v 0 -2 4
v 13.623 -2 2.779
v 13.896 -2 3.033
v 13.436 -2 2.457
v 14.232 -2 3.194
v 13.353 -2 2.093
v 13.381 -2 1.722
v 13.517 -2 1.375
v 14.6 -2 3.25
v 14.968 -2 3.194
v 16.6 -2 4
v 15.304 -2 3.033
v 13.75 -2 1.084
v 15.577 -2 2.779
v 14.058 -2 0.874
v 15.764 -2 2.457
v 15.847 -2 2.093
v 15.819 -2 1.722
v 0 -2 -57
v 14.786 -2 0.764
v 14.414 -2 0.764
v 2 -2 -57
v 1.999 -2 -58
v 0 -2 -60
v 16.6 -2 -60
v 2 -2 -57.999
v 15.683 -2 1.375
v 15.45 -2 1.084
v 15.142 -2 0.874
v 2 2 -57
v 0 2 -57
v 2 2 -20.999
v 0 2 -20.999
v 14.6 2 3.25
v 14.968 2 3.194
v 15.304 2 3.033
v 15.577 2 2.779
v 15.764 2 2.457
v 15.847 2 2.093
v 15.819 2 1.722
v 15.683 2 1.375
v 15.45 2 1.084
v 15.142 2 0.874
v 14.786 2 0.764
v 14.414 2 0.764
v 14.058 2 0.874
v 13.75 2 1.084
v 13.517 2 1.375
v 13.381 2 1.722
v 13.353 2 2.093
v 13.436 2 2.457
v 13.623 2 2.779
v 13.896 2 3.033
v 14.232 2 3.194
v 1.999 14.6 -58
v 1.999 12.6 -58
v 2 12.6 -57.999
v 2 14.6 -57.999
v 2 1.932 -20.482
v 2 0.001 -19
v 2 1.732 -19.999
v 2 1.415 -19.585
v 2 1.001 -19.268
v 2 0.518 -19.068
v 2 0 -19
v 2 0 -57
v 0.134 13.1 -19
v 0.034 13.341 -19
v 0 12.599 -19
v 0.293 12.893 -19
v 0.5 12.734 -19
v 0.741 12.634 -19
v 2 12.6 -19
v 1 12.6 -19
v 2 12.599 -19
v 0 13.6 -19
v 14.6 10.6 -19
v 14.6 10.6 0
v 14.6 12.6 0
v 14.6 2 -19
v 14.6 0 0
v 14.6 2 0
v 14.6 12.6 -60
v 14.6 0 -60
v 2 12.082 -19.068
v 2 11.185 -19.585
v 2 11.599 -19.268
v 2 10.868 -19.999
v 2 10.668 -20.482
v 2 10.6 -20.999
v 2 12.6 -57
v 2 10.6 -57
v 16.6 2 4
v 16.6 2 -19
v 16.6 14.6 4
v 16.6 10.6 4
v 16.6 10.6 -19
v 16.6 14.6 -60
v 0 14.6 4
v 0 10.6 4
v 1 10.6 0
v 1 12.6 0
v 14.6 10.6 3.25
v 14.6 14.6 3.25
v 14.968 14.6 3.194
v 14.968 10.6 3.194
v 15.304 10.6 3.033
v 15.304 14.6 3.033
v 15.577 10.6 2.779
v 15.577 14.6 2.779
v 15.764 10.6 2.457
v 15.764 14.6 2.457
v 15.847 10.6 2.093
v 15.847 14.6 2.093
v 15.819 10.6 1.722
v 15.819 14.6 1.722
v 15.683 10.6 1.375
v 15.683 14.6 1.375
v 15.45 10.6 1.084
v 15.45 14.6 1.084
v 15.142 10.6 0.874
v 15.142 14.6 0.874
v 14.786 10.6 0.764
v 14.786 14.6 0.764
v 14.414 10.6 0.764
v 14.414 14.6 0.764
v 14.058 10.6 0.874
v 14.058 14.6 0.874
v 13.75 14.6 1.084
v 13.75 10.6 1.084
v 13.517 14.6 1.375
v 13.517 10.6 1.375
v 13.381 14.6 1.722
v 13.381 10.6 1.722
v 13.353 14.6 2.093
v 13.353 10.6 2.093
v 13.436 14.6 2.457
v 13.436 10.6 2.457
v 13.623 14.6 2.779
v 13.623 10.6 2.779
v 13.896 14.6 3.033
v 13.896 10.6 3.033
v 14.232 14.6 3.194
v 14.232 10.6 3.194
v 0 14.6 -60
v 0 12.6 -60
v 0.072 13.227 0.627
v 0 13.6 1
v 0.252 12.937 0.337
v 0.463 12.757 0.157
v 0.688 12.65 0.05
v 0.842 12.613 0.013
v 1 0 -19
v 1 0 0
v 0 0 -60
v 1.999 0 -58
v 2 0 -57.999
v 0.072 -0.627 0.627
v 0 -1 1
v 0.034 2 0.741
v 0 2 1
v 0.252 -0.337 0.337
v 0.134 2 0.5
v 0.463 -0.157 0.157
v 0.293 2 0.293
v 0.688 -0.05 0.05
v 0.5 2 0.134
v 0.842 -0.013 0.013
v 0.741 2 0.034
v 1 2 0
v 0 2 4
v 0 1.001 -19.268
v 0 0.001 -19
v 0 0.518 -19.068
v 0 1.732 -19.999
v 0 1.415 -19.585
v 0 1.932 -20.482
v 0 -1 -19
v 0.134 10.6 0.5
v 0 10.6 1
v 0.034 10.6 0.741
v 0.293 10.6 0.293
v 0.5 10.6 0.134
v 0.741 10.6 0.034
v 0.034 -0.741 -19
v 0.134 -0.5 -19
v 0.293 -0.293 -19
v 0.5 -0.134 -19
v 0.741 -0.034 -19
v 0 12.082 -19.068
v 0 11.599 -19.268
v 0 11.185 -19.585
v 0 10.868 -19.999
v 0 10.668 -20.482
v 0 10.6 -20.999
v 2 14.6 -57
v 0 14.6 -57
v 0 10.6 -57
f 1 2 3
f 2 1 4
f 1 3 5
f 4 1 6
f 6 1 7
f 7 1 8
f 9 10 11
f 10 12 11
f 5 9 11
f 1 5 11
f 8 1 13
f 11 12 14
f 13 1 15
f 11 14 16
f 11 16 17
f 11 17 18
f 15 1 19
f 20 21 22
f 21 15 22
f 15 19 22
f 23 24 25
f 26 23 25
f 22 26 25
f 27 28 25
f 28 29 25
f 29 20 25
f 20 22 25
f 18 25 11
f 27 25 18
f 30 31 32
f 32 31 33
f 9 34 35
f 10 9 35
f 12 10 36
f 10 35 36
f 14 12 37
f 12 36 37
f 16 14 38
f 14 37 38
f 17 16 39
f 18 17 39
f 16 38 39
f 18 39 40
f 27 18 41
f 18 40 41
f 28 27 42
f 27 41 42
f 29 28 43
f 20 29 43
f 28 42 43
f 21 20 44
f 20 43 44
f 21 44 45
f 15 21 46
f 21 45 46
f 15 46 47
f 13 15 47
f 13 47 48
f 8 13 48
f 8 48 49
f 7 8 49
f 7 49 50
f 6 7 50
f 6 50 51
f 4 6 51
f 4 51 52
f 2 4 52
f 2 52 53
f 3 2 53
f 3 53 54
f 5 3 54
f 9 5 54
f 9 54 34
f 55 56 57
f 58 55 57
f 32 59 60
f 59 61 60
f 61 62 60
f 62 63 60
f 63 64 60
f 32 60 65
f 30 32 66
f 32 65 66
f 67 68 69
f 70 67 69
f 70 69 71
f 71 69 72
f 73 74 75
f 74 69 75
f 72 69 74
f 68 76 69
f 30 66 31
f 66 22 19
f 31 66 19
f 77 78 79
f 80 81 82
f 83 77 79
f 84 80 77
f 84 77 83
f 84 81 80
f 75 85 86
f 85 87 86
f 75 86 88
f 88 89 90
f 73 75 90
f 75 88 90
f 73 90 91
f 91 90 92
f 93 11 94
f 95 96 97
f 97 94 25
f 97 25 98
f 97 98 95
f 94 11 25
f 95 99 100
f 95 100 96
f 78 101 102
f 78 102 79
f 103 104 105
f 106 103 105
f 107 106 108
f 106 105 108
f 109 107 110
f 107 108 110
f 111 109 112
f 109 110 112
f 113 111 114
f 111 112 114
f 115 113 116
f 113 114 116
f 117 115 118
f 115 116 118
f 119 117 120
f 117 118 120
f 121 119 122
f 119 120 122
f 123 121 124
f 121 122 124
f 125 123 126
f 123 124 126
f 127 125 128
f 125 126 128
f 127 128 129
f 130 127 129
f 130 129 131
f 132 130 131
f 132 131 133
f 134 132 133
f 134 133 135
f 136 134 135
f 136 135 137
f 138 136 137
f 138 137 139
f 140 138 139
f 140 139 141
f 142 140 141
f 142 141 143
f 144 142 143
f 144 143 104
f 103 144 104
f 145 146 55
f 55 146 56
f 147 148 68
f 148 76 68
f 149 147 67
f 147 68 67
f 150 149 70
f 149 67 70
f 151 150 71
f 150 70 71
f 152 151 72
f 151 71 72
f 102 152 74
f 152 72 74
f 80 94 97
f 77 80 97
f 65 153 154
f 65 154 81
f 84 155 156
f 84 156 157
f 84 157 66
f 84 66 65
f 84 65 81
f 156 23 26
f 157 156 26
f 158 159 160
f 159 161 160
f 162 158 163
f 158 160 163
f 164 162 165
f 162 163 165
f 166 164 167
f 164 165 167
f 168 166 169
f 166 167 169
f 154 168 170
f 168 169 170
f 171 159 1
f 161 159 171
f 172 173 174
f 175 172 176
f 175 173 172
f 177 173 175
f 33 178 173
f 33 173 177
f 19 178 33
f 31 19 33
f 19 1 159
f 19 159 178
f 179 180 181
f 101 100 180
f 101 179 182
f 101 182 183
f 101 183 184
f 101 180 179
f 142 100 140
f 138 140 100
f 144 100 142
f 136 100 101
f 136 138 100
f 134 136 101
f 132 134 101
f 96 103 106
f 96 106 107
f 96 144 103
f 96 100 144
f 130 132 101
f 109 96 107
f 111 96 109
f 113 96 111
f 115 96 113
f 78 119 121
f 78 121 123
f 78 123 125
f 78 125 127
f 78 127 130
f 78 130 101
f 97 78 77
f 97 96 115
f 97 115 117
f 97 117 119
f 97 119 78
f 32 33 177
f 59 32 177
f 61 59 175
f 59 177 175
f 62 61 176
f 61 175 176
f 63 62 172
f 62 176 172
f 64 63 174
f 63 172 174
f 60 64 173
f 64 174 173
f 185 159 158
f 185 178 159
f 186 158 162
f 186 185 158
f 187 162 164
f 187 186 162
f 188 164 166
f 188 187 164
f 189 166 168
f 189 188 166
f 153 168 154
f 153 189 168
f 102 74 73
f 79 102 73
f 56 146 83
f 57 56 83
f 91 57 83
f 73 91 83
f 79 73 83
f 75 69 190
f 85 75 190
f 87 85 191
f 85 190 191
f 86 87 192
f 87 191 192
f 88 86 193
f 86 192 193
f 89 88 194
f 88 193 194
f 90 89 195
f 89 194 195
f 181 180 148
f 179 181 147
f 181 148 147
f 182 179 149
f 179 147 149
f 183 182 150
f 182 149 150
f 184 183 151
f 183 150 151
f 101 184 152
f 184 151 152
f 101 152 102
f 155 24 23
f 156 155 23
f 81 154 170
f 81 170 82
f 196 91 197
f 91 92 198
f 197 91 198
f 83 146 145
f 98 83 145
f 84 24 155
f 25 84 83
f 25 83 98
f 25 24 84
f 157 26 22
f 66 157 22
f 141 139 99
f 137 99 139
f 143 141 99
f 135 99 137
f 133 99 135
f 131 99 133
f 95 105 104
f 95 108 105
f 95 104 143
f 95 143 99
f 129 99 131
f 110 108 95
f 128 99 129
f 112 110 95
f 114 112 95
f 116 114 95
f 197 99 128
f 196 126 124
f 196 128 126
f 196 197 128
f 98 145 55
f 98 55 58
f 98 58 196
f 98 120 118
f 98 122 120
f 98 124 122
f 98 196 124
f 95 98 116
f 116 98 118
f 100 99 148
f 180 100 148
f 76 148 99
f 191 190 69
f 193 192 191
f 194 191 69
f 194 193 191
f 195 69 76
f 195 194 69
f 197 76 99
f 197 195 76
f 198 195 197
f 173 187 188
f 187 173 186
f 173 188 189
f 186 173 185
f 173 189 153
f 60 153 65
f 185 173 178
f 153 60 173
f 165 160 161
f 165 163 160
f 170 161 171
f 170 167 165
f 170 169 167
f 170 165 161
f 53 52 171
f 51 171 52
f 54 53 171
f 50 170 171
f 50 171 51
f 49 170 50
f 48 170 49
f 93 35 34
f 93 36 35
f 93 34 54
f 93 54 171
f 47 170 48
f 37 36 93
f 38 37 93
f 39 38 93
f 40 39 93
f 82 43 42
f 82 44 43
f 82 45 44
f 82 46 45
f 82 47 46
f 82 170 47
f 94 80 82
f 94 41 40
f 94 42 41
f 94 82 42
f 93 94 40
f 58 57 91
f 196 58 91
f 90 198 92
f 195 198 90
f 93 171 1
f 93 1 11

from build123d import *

# Parameters (mm, degrees)
SKETCH1_W               = 16.6
SKETCH1_H               = 62
BOSS_EXTRUDE1_DEPTH     = 2
SKETCH1_7_W             = 2
SKETCH1_7_H             = 41
BOSS_EXTRUDE2_DEPTH     = 12.6
SKETCH2_W               = 16.6
SKETCH2_H               = 62
BOSS_EXTRUDE3_DEPTH     = 2
SKETCH3_W               = 41
SKETCH3_H               = 8.6
CUT_EXTRUDE1_DEPTH      = 2
CUT_EXTRUDE2_DEPTH      = 2
CUT_EXTRUDE4_DEPTH      = 17.5
CUT_EXTRUDE4_DEPTH_BACK = 14.5
SKETCH5_W               = 21
SKETCH5_H               = 8.6
SKETCH7_W               = 16.6
SKETCH7_H               = 4
BOSS_EXTRUDE4_DEPTH     = 2
SKETCH9_R               = 1.25
CUT_EXTRUDE6_DEPTH      = 20
FILLET3_R               = 1
CUT_EXTRUDE7_DEPTH      = 21
SKETCH13_W              = 2
SKETCH13_H              = 2
CUT_EXTRUDE8_DEPTH      = 3


with BuildPart() as part:
    # Sketch1 → Boss-Extrude1 (new body)
    with BuildSketch(Plane(origin=(0, 0, 0), x_dir=(1, 0, 0), z_dir=(0, 1, 0))):
        with Locations((8.3, 29)):
            Rectangle(SKETCH1_W, SKETCH1_H)
    extrude(amount=-BOSS_EXTRUDE1_DEPTH)

    # Sketch1<7> → Boss-Extrude2 (add)
    with BuildSketch(Plane(origin=(0, 0, 0), x_dir=(1, 0, 0), z_dir=(0, 1, 0))):
        with Locations((1, 39.5)):
            Rectangle(SKETCH1_7_W, SKETCH1_7_H)
        Polygon((16.6, 60), (14.6, 60), (14.6, 0), (0, 0), (0, -2), (16.6, -2), align=None)
    extrude(amount=BOSS_EXTRUDE2_DEPTH)

    # Sketch2 → Boss-Extrude3 (add)
    with BuildSketch(Plane(origin=(0, 12.6, 0), x_dir=(1, 0, 0), z_dir=(0, 1, 0))):
        with Locations((8.3, 29)):
            Rectangle(SKETCH2_W, SKETCH2_H)
    extrude(amount=BOSS_EXTRUDE3_DEPTH)

    # Sketch3 → Cut-Extrude1 (cut)
    with BuildSketch(Plane.ZY):
        with Locations((-39.5, 6.3)):
            Rectangle(SKETCH3_W, SKETCH3_H)
    extrude(amount=-CUT_EXTRUDE1_DEPTH, mode=Mode.SUBTRACT)

    # Sketch4 → Cut-Extrude2 (cut)
    with BuildSketch(Plane.ZY):
        with BuildLine():
            ThreePointArc((-20.999, 2), (-19.585493544, 1.414506456), (-19, 0.001))
            Line((-19, 0.001), (-19, 2))
            Line((-19, 2), (-20.999, 2))
        make_face()
        with BuildLine():
            ThreePointArc((-19, 12.599), (-19.585493544, 11.185493544), (-20.999, 10.6))
            Line((-20.999, 10.6), (-19, 10.6))
            Line((-19, 10.6), (-19, 12.599))
        make_face()
    extrude(amount=-CUT_EXTRUDE2_DEPTH, mode=Mode.SUBTRACT)

    # Sketch5 → Cut-Extrude4 (cut, two sides: drawn at the far end of the back side and taken through both)
    with BuildSketch(Plane.ZY.offset(-14.6).offset(-CUT_EXTRUDE4_DEPTH_BACK)):
        with Locations((-8.5, 6.3)):
            Rectangle(SKETCH5_W, SKETCH5_H)
    extrude(amount=CUT_EXTRUDE4_DEPTH + CUT_EXTRUDE4_DEPTH_BACK, mode=Mode.SUBTRACT)

    # Sketch7 → Boss-Extrude4 (add)
    with BuildSketch(Plane.XY.offset(2)):
        with Locations((8.3, 0)):
            Rectangle(SKETCH7_W, SKETCH7_H)
        with Locations((8.3, 12.6)):
            Rectangle(SKETCH7_W, SKETCH7_H)
    extrude(amount=BOSS_EXTRUDE4_DEPTH)

    # Sketch9 → Cut-Extrude6 (cut)
    with BuildSketch(Plane(origin=(0, 14.6, 0), x_dir=(1, 0, 0), z_dir=(0, 1, 0))):
        with Locations((14.6, -2)):
            Circle(SKETCH9_R)
    extrude(amount=-CUT_EXTRUDE6_DEPTH, mode=Mode.SUBTRACT)

    # Fillet3
    fillet3_edges = [part.edges().sort_by_distance(p)[0] for p in [
        (0, 12.6, -9.5),
        (0, 11.6, 0),
        (0, 1, 0),
        (0, 0, -9.5),
    ]]
    fillet(fillet3_edges, radius=FILLET3_R)

    # Sketch12 → Cut-Extrude7 (cut)
    with BuildSketch(Plane(origin=(0, -2, 0), x_dir=(-1, 0, 0), z_dir=(0, -1, 0))):
        Polygon((0, 59.999), (0, 60), (-1.99900025, 58.00000025), (-2, 57.999), (-2, 57), (0, 57), (0, 57.999), (0, 58), align=None)
    extrude(amount=-CUT_EXTRUDE7_DEPTH, mode=Mode.SUBTRACT)

    # Sketch13 → Cut-Extrude8 (cut)
    with BuildSketch(Plane(origin=(0, 0, -60), x_dir=(-1, 0, 0), z_dir=(0, 0, -1))):
        with Locations((-1, 11.6)):
            Rectangle(SKETCH13_W, SKETCH13_H)
        with Locations((-1, 1)):
            Rectangle(SKETCH13_W, SKETCH13_H)
    extrude(amount=-CUT_EXTRUDE8_DEPTH, mode=Mode.SUBTRACT)


solid = part.part
